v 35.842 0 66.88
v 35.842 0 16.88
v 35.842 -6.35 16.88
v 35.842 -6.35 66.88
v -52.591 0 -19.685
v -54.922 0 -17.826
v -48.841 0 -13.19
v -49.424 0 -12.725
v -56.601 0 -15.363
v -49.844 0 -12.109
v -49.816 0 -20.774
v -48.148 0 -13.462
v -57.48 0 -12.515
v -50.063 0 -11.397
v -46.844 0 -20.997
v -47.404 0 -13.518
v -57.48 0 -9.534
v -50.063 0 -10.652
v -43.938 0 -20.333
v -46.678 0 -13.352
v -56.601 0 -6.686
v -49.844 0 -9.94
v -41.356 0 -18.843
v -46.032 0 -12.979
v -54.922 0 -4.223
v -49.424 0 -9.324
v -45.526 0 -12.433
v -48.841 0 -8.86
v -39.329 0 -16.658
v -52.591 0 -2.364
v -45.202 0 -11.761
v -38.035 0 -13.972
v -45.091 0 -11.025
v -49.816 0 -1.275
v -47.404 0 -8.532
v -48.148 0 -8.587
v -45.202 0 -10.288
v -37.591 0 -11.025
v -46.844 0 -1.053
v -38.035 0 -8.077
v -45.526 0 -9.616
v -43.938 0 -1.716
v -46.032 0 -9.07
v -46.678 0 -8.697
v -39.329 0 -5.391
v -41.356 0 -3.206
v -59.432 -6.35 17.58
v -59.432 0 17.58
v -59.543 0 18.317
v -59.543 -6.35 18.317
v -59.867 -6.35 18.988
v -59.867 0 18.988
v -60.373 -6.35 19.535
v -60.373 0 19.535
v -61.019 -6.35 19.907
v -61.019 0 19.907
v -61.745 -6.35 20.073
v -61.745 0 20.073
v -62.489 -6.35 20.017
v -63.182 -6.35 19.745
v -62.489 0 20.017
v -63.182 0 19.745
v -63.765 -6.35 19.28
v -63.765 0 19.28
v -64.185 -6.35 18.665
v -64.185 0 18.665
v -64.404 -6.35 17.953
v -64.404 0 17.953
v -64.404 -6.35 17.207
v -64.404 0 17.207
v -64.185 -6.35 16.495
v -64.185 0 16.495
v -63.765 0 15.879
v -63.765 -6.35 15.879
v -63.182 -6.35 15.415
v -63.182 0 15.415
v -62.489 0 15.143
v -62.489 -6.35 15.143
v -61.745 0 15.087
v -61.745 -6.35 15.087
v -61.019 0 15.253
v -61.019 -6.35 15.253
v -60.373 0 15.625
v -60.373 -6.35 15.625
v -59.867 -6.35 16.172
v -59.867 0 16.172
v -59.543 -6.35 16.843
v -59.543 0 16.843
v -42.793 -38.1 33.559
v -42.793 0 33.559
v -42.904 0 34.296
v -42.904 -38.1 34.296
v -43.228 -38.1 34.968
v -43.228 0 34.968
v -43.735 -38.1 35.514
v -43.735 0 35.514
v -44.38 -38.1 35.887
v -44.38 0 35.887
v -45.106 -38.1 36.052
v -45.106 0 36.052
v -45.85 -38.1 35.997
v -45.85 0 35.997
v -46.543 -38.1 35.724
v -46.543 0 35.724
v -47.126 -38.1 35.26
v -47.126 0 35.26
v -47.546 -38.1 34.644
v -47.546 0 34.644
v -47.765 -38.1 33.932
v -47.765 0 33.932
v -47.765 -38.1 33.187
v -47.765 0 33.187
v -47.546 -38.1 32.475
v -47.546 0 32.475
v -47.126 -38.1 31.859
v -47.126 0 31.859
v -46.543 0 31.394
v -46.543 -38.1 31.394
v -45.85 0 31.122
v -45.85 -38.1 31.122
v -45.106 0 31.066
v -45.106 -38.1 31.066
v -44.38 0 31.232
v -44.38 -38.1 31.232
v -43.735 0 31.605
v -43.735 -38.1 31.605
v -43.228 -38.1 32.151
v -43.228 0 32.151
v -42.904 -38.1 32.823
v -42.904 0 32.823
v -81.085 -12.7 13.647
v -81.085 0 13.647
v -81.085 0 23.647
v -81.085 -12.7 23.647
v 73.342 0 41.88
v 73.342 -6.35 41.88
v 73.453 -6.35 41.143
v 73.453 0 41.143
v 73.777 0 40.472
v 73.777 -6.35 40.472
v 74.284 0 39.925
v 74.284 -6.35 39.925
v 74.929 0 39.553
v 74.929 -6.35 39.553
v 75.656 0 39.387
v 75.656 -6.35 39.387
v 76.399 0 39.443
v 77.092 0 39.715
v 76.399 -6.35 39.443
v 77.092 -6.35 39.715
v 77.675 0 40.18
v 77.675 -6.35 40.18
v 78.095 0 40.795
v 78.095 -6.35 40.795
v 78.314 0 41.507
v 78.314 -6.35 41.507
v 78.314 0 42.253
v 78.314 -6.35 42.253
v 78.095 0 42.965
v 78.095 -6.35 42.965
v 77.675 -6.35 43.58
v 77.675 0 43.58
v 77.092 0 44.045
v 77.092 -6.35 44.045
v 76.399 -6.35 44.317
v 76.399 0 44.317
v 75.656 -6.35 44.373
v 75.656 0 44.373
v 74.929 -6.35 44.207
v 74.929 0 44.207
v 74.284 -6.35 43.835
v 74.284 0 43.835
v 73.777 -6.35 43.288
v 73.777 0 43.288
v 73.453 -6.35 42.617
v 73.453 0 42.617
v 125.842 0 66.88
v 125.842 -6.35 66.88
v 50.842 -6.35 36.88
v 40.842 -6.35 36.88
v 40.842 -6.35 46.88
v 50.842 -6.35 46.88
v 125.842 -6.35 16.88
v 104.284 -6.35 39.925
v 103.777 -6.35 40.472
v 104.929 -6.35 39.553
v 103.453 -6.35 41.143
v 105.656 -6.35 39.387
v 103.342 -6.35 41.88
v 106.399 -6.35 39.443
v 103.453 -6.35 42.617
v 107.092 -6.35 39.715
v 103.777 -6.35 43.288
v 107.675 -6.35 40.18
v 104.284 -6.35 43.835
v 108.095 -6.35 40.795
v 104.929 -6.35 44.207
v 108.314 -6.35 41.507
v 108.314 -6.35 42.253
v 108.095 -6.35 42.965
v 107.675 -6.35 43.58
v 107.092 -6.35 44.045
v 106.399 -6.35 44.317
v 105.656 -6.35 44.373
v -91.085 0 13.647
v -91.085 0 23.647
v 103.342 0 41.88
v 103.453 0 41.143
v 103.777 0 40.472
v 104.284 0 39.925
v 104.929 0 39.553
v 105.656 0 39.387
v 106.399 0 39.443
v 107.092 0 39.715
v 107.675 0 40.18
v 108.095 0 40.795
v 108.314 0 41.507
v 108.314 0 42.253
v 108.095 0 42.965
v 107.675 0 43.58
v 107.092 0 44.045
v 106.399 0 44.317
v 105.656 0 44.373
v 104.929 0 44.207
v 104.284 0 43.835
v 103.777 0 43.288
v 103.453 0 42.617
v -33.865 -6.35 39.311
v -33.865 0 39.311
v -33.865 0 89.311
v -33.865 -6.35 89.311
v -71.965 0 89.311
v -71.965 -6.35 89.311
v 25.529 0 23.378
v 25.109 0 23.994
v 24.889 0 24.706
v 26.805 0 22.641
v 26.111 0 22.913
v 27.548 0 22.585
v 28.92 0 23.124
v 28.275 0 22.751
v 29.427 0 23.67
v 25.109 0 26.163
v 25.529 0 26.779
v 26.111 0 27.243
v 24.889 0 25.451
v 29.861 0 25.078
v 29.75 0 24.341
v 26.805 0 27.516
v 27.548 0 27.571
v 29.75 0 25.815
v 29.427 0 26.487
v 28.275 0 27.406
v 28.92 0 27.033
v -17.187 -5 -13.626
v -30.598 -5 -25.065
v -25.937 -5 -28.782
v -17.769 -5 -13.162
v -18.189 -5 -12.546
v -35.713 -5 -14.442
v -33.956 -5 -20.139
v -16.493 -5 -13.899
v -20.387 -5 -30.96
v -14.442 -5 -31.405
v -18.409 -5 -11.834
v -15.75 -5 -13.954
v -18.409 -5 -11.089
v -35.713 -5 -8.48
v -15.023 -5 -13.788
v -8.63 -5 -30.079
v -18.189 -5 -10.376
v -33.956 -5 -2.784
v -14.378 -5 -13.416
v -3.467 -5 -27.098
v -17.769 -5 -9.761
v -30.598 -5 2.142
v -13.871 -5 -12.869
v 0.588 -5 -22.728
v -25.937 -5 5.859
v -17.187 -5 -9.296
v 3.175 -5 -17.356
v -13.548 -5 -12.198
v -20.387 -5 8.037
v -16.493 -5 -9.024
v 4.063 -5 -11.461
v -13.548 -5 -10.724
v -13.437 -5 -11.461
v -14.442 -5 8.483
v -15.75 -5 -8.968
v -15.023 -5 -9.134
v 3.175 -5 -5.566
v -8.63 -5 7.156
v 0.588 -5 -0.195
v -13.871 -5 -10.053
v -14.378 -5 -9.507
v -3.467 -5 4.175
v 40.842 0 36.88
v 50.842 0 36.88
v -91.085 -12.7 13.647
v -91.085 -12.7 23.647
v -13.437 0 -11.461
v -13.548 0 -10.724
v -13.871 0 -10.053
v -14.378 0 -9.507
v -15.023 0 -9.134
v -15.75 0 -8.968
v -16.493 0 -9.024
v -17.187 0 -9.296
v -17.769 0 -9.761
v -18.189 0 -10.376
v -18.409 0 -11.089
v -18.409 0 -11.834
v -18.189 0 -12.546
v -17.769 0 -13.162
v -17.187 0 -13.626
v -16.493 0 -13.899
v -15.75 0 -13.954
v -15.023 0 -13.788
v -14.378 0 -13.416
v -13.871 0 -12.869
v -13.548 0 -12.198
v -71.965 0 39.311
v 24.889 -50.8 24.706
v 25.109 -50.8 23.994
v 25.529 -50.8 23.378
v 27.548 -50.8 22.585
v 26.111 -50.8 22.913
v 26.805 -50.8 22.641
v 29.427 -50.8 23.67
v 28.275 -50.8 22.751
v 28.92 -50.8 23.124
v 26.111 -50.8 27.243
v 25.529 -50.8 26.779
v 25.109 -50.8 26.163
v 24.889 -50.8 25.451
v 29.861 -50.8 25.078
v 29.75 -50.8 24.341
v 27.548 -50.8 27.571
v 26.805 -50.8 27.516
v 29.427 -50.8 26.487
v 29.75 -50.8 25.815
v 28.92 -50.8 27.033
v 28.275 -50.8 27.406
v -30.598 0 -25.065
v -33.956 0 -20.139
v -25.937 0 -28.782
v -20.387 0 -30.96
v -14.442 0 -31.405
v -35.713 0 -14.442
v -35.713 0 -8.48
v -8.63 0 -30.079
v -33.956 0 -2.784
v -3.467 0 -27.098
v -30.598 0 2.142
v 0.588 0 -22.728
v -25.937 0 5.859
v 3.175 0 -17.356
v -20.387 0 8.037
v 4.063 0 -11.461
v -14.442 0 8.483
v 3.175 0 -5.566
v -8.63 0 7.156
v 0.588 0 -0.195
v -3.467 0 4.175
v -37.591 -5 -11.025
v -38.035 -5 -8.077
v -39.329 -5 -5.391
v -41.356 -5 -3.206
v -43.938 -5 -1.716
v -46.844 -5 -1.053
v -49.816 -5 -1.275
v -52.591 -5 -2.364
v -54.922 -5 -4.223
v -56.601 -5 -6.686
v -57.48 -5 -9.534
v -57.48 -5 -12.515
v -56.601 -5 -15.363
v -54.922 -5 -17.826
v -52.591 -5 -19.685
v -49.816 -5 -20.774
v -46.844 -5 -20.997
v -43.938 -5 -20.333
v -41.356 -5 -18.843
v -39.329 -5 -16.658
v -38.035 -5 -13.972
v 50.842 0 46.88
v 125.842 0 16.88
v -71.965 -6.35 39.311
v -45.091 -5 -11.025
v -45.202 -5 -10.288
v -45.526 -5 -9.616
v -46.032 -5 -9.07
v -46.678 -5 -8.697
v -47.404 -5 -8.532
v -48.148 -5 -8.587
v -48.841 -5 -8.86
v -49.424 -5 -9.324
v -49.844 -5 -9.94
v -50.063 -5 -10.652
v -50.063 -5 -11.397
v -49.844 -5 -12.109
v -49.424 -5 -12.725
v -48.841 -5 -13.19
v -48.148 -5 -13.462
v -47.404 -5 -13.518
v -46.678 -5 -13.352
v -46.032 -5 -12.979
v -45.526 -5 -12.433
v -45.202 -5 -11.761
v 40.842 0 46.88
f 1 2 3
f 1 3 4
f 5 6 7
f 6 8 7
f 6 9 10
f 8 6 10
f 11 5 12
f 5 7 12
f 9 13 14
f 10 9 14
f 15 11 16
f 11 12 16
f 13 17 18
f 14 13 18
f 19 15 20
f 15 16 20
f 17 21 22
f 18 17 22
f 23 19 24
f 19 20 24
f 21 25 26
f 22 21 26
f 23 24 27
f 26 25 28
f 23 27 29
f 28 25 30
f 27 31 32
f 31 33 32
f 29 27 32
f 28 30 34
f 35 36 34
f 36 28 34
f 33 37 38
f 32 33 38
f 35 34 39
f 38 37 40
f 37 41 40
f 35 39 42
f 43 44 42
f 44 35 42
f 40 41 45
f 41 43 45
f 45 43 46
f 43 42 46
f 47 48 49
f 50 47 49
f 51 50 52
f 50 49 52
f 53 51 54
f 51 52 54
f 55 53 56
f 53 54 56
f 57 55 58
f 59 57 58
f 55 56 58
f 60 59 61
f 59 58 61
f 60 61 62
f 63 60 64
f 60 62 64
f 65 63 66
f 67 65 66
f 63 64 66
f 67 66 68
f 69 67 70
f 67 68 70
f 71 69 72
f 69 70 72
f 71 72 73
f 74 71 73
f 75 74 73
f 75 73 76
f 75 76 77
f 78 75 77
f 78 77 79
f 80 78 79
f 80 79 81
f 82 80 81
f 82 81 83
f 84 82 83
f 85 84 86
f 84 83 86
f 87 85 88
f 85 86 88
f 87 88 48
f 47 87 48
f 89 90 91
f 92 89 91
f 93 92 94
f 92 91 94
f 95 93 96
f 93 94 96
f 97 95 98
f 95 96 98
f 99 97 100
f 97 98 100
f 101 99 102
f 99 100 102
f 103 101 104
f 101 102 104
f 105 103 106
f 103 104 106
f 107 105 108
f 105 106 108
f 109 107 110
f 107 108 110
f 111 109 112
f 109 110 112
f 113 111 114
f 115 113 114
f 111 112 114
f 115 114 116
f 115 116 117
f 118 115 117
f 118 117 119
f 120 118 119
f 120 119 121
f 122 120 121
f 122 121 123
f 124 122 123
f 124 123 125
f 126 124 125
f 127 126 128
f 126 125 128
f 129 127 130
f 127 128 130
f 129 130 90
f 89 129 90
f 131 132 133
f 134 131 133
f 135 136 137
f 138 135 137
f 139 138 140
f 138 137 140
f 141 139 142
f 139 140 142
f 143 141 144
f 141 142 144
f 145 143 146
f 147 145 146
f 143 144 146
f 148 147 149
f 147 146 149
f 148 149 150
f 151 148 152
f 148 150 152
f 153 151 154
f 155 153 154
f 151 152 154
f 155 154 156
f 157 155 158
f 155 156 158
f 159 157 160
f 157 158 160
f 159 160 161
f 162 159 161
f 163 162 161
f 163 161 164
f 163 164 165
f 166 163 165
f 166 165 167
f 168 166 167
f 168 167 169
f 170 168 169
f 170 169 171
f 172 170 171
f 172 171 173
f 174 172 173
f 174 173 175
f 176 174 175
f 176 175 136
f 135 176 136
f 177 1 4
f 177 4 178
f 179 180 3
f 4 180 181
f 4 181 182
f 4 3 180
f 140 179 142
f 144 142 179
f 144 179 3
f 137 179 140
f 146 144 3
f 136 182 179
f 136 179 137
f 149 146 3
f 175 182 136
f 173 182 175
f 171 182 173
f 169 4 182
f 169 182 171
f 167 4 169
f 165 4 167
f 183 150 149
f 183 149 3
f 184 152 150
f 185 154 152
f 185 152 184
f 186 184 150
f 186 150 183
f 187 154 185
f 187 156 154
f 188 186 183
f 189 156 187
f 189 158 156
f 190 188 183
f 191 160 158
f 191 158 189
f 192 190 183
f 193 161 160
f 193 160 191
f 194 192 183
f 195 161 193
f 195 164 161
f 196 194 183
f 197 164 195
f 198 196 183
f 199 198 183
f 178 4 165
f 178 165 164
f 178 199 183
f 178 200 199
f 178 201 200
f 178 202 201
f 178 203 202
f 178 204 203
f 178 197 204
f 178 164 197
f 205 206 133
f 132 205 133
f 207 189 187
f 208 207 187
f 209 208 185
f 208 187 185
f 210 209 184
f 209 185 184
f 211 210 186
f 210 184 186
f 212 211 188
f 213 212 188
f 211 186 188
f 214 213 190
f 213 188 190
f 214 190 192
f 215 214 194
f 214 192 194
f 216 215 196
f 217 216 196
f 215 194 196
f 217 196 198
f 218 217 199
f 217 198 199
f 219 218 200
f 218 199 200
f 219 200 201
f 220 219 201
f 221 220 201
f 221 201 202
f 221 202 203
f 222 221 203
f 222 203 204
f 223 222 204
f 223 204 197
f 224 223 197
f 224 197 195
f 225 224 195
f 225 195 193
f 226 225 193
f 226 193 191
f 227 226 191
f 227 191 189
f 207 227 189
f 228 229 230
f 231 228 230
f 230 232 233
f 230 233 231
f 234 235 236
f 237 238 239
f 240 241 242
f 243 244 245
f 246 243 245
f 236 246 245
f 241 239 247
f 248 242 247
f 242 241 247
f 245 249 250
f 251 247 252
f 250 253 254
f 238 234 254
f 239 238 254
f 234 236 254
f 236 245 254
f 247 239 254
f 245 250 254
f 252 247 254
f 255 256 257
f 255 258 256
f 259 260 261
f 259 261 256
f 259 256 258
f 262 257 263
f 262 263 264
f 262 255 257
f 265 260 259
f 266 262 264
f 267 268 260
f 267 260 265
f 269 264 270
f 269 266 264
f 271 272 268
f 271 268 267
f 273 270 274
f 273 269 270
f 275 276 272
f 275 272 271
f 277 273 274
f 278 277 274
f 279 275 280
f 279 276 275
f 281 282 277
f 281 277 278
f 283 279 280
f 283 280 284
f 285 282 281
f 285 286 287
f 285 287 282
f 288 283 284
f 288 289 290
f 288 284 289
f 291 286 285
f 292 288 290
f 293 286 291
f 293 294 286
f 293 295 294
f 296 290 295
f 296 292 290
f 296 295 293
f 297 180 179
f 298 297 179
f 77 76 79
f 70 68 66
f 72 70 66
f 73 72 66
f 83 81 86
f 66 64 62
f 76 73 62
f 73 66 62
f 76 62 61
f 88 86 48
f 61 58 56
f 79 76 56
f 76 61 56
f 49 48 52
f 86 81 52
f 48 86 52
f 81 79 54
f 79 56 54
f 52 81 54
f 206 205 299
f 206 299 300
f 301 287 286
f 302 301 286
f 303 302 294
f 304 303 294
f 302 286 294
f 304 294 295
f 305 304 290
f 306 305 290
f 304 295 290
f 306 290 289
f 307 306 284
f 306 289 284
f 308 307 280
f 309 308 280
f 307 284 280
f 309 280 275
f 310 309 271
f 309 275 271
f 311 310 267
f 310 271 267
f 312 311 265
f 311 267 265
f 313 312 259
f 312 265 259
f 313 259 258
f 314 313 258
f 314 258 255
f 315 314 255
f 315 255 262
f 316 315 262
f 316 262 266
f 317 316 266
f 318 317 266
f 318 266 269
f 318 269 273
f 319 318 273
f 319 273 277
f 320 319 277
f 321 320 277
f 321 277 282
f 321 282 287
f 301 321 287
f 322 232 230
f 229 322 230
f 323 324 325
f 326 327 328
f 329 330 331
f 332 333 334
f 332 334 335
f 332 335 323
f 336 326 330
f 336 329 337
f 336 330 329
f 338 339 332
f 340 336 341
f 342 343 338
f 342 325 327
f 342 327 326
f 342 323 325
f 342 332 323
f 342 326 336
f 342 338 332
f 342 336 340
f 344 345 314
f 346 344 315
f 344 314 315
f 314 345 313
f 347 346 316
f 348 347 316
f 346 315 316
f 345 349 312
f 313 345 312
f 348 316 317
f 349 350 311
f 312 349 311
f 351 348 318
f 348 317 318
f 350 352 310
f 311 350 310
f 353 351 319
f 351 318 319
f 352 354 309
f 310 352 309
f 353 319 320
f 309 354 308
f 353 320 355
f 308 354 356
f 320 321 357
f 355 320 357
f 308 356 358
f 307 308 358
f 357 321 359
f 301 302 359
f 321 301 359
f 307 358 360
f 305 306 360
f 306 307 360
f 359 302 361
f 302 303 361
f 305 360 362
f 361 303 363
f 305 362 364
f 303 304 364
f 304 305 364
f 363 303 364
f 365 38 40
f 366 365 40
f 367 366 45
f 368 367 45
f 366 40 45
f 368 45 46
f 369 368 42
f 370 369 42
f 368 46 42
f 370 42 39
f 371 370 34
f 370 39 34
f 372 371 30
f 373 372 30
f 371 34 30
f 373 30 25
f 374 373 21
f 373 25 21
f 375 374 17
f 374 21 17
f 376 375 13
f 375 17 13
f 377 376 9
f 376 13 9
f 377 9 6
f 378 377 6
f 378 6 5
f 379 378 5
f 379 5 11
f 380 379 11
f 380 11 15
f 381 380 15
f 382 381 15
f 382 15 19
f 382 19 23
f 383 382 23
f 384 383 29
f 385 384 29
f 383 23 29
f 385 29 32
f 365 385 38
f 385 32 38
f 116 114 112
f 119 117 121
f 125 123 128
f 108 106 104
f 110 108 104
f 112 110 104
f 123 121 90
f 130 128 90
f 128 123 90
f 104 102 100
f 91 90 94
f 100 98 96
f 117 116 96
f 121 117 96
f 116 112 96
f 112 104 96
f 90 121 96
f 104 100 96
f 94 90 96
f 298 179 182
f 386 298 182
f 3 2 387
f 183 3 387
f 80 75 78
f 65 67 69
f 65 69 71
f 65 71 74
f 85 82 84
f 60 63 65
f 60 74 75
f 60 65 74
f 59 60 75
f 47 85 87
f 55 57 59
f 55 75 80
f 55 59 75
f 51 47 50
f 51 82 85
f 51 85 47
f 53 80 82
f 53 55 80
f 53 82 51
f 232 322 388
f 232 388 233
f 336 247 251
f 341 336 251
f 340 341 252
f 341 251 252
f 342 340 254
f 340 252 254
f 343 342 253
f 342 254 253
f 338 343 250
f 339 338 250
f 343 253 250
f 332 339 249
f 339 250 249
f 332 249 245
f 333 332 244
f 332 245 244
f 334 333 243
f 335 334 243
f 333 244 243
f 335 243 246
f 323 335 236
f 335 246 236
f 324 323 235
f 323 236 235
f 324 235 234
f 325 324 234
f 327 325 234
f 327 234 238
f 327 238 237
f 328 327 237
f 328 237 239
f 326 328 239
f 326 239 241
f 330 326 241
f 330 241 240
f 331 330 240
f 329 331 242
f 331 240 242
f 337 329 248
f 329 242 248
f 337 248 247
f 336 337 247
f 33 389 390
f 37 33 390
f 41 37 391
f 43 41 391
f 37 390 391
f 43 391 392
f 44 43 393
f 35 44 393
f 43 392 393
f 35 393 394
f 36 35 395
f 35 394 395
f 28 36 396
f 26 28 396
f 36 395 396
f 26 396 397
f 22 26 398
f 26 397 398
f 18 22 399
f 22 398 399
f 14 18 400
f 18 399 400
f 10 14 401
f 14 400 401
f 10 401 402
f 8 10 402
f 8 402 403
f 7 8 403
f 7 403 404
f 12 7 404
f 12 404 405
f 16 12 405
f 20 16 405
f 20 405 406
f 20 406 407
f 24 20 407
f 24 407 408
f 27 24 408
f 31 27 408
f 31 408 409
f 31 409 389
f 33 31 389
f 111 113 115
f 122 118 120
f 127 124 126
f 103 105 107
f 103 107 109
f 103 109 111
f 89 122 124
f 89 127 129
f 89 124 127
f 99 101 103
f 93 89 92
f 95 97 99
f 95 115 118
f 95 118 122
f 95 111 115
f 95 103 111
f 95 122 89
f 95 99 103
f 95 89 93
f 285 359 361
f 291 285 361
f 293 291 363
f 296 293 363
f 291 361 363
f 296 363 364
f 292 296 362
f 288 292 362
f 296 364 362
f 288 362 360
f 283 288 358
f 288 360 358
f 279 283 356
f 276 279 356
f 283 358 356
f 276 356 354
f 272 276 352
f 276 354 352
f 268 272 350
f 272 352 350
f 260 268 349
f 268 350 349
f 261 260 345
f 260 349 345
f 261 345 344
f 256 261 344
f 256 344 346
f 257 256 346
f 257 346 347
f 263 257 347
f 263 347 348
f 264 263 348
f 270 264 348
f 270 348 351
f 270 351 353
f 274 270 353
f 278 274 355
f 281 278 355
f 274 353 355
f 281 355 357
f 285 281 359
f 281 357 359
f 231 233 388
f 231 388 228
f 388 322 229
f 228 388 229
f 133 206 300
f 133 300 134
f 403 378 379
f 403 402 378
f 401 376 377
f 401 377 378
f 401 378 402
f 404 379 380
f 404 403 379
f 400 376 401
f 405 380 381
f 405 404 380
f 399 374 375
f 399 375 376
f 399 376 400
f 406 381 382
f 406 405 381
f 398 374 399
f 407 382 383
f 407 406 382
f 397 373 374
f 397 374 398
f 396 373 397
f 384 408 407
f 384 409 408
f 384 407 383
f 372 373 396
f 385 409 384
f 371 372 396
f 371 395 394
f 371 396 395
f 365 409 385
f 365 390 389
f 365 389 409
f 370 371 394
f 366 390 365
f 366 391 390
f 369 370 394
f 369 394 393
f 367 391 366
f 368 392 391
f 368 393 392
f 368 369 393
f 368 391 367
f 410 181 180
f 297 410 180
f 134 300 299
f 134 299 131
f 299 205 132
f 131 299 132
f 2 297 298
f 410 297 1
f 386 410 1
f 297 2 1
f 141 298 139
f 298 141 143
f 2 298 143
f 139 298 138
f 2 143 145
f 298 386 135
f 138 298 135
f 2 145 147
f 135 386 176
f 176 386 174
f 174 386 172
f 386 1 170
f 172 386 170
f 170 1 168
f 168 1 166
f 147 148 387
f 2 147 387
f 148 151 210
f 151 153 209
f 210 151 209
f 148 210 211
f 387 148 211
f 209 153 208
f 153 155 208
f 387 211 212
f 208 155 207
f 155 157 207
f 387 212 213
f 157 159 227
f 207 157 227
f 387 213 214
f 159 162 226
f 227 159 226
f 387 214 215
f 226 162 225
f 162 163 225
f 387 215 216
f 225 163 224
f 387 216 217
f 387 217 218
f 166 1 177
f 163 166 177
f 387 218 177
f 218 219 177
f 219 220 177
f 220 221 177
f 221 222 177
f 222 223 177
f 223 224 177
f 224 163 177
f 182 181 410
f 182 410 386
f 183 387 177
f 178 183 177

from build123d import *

# Parameters (mm, degrees)
F0_R      = 10
F1_DEPTH  = 5
F0_R_2    = 20
F2_R      = 2.5
F3_DEPTH  = 5.001
F4_R      = 2.5
F5_DEPTH  = 5.001
F6_R      = 2.5
F7_DEPTH  = 38.1
F8_R      = 2.5
F9_DEPTH  = 50.8
F10_W     = 38.1
F10_H     = 50
F11_DEPTH = 6.35
F10_W_2   = 90
F12_W     = 10
F12_H     = 5
F13_DEPTH = 6.351
F14_W     = 10
F14_H     = 10
F15_DEPTH = 12.7
F16_R     = 2.5
F17_DEPTH = 6.35


with BuildPart() as f1:
    # F0 (on Front) → F1 (new body)
    with BuildSketch(Plane.XZ):
        with Locations((-47.5912168622, -11.0245700926)):
            Circle(F0_R)
    extrude(amount=F1_DEPTH)

    # F2 (on face) → F3 (cut, through all)
    with BuildSketch(Plane.XZ.offset(5)):
        with Locations((-47.5912168622, -11.0245700926)):
            Circle(F2_R)
    extrude(amount=-F3_DEPTH, mode=Mode.SUBTRACT)


with BuildPart() as f1b:
    # F0 (on Front) → F1, piece 2 (new body)
    with BuildSketch(Plane.XZ):
        with Locations((-15.9365069121, -11.4611871541)):
            Circle(F0_R_2)
    extrude(amount=F1_DEPTH)

    # F4 (on face) → F5 (cut, through all)
    with BuildSketch(Plane.XZ.offset(5)):
        with Locations((-15.9365069121, -11.4611871541)):
            Circle(F4_R)
    extrude(amount=-F5_DEPTH, mode=Mode.SUBTRACT)


with BuildPart() as f7:
    # F6 (on Front) → F7 (new body)
    with BuildSketch(Plane.XZ):
        with Locations((-45.2932268381, 33.5594303906)):
            Circle(F6_R)
    extrude(amount=F7_DEPTH)


with BuildPart() as f9:
    # F8 (on Front) → F9 (new body)
    with BuildSketch(Plane.XZ):
        with Locations((27.3612700403, 25.0783581287)):
            Circle(F8_R)
    extrude(amount=F9_DEPTH)


with BuildPart() as f11:
    # F10 (on Front) → F11 (new body)
    with BuildSketch(Plane.XZ):
        with Locations((-52.9153950814, 64.3106035315)):
            Rectangle(F10_W, F10_H)
    extrude(amount=F11_DEPTH)


with BuildPart() as f11b:
    # F10 (on Front) → F11, piece 2 (new body)
    with BuildSketch(Plane.XZ):
        with Locations((80.8423385769, 41.8799925596)):
            Rectangle(F10_W_2, F10_H)
    extrude(amount=F11_DEPTH)

    # F12 (on face) → F13 (cut, through all)
    with BuildSketch(Plane.XZ.offset(6.35)):
        with BuildLine():
            ThreePointArc((78.3423385769, 41.8799925596), (75.8423385769, 44.3799925596), (73.3423385769, 41.8799925596))
            Line((73.3423385769, 41.8799925596), (78.3423385769, 41.8799925596))
        make_face()
        with BuildLine():
            Line((78.3423385769, 41.8799925596), (73.3423385769, 41.8799925596))
            ThreePointArc((73.3423385769, 41.8799925596), (75.8423385769, 39.3799925596), (78.3423385769, 41.8799925596))
        make_face()
        with BuildLine():
            Line((103.3423385769, 41.8799925596), (108.3423385769, 41.8799925596))
            ThreePointArc((108.3423385769, 41.8799925596), (105.8423385769, 44.3799925596), (103.3423385769, 41.8799925596))
        make_face()
        with BuildLine():
            ThreePointArc((103.3423385769, 41.8799925596), (105.8423385769, 39.3799925596), (108.3423385769, 41.8799925596))
            Line((108.3423385769, 41.8799925596), (103.3423385769, 41.8799925596))
        make_face()
        with Locations((45.8423385769, 39.3799925596)):
            Rectangle(F12_W, F12_H)
        with Locations((45.8423385769, 44.3799925596)):
            Rectangle(F12_W, F12_H)
    extrude(amount=-F13_DEPTH, mode=Mode.SUBTRACT)


with BuildPart() as f15:
    # F14 (on Front) → F15 (new body)
    with BuildSketch(Plane.XZ):
        with Locations((-86.0851626339, 18.6468316242)):
            Rectangle(F14_W, F14_H)
    extrude(amount=F15_DEPTH)


with BuildPart() as f17:
    # F16 (on Front) → F17 (new body)
    with BuildSketch(Plane.XZ):
        with Locations((-61.932221055, 17.5799317658)):
            Circle(F16_R)
    extrude(amount=F17_DEPTH)


solid = Compound([f1.part, f1b.part, f7.part, f9.part, f11.part, f11b.part, f15.part, f17.part])
